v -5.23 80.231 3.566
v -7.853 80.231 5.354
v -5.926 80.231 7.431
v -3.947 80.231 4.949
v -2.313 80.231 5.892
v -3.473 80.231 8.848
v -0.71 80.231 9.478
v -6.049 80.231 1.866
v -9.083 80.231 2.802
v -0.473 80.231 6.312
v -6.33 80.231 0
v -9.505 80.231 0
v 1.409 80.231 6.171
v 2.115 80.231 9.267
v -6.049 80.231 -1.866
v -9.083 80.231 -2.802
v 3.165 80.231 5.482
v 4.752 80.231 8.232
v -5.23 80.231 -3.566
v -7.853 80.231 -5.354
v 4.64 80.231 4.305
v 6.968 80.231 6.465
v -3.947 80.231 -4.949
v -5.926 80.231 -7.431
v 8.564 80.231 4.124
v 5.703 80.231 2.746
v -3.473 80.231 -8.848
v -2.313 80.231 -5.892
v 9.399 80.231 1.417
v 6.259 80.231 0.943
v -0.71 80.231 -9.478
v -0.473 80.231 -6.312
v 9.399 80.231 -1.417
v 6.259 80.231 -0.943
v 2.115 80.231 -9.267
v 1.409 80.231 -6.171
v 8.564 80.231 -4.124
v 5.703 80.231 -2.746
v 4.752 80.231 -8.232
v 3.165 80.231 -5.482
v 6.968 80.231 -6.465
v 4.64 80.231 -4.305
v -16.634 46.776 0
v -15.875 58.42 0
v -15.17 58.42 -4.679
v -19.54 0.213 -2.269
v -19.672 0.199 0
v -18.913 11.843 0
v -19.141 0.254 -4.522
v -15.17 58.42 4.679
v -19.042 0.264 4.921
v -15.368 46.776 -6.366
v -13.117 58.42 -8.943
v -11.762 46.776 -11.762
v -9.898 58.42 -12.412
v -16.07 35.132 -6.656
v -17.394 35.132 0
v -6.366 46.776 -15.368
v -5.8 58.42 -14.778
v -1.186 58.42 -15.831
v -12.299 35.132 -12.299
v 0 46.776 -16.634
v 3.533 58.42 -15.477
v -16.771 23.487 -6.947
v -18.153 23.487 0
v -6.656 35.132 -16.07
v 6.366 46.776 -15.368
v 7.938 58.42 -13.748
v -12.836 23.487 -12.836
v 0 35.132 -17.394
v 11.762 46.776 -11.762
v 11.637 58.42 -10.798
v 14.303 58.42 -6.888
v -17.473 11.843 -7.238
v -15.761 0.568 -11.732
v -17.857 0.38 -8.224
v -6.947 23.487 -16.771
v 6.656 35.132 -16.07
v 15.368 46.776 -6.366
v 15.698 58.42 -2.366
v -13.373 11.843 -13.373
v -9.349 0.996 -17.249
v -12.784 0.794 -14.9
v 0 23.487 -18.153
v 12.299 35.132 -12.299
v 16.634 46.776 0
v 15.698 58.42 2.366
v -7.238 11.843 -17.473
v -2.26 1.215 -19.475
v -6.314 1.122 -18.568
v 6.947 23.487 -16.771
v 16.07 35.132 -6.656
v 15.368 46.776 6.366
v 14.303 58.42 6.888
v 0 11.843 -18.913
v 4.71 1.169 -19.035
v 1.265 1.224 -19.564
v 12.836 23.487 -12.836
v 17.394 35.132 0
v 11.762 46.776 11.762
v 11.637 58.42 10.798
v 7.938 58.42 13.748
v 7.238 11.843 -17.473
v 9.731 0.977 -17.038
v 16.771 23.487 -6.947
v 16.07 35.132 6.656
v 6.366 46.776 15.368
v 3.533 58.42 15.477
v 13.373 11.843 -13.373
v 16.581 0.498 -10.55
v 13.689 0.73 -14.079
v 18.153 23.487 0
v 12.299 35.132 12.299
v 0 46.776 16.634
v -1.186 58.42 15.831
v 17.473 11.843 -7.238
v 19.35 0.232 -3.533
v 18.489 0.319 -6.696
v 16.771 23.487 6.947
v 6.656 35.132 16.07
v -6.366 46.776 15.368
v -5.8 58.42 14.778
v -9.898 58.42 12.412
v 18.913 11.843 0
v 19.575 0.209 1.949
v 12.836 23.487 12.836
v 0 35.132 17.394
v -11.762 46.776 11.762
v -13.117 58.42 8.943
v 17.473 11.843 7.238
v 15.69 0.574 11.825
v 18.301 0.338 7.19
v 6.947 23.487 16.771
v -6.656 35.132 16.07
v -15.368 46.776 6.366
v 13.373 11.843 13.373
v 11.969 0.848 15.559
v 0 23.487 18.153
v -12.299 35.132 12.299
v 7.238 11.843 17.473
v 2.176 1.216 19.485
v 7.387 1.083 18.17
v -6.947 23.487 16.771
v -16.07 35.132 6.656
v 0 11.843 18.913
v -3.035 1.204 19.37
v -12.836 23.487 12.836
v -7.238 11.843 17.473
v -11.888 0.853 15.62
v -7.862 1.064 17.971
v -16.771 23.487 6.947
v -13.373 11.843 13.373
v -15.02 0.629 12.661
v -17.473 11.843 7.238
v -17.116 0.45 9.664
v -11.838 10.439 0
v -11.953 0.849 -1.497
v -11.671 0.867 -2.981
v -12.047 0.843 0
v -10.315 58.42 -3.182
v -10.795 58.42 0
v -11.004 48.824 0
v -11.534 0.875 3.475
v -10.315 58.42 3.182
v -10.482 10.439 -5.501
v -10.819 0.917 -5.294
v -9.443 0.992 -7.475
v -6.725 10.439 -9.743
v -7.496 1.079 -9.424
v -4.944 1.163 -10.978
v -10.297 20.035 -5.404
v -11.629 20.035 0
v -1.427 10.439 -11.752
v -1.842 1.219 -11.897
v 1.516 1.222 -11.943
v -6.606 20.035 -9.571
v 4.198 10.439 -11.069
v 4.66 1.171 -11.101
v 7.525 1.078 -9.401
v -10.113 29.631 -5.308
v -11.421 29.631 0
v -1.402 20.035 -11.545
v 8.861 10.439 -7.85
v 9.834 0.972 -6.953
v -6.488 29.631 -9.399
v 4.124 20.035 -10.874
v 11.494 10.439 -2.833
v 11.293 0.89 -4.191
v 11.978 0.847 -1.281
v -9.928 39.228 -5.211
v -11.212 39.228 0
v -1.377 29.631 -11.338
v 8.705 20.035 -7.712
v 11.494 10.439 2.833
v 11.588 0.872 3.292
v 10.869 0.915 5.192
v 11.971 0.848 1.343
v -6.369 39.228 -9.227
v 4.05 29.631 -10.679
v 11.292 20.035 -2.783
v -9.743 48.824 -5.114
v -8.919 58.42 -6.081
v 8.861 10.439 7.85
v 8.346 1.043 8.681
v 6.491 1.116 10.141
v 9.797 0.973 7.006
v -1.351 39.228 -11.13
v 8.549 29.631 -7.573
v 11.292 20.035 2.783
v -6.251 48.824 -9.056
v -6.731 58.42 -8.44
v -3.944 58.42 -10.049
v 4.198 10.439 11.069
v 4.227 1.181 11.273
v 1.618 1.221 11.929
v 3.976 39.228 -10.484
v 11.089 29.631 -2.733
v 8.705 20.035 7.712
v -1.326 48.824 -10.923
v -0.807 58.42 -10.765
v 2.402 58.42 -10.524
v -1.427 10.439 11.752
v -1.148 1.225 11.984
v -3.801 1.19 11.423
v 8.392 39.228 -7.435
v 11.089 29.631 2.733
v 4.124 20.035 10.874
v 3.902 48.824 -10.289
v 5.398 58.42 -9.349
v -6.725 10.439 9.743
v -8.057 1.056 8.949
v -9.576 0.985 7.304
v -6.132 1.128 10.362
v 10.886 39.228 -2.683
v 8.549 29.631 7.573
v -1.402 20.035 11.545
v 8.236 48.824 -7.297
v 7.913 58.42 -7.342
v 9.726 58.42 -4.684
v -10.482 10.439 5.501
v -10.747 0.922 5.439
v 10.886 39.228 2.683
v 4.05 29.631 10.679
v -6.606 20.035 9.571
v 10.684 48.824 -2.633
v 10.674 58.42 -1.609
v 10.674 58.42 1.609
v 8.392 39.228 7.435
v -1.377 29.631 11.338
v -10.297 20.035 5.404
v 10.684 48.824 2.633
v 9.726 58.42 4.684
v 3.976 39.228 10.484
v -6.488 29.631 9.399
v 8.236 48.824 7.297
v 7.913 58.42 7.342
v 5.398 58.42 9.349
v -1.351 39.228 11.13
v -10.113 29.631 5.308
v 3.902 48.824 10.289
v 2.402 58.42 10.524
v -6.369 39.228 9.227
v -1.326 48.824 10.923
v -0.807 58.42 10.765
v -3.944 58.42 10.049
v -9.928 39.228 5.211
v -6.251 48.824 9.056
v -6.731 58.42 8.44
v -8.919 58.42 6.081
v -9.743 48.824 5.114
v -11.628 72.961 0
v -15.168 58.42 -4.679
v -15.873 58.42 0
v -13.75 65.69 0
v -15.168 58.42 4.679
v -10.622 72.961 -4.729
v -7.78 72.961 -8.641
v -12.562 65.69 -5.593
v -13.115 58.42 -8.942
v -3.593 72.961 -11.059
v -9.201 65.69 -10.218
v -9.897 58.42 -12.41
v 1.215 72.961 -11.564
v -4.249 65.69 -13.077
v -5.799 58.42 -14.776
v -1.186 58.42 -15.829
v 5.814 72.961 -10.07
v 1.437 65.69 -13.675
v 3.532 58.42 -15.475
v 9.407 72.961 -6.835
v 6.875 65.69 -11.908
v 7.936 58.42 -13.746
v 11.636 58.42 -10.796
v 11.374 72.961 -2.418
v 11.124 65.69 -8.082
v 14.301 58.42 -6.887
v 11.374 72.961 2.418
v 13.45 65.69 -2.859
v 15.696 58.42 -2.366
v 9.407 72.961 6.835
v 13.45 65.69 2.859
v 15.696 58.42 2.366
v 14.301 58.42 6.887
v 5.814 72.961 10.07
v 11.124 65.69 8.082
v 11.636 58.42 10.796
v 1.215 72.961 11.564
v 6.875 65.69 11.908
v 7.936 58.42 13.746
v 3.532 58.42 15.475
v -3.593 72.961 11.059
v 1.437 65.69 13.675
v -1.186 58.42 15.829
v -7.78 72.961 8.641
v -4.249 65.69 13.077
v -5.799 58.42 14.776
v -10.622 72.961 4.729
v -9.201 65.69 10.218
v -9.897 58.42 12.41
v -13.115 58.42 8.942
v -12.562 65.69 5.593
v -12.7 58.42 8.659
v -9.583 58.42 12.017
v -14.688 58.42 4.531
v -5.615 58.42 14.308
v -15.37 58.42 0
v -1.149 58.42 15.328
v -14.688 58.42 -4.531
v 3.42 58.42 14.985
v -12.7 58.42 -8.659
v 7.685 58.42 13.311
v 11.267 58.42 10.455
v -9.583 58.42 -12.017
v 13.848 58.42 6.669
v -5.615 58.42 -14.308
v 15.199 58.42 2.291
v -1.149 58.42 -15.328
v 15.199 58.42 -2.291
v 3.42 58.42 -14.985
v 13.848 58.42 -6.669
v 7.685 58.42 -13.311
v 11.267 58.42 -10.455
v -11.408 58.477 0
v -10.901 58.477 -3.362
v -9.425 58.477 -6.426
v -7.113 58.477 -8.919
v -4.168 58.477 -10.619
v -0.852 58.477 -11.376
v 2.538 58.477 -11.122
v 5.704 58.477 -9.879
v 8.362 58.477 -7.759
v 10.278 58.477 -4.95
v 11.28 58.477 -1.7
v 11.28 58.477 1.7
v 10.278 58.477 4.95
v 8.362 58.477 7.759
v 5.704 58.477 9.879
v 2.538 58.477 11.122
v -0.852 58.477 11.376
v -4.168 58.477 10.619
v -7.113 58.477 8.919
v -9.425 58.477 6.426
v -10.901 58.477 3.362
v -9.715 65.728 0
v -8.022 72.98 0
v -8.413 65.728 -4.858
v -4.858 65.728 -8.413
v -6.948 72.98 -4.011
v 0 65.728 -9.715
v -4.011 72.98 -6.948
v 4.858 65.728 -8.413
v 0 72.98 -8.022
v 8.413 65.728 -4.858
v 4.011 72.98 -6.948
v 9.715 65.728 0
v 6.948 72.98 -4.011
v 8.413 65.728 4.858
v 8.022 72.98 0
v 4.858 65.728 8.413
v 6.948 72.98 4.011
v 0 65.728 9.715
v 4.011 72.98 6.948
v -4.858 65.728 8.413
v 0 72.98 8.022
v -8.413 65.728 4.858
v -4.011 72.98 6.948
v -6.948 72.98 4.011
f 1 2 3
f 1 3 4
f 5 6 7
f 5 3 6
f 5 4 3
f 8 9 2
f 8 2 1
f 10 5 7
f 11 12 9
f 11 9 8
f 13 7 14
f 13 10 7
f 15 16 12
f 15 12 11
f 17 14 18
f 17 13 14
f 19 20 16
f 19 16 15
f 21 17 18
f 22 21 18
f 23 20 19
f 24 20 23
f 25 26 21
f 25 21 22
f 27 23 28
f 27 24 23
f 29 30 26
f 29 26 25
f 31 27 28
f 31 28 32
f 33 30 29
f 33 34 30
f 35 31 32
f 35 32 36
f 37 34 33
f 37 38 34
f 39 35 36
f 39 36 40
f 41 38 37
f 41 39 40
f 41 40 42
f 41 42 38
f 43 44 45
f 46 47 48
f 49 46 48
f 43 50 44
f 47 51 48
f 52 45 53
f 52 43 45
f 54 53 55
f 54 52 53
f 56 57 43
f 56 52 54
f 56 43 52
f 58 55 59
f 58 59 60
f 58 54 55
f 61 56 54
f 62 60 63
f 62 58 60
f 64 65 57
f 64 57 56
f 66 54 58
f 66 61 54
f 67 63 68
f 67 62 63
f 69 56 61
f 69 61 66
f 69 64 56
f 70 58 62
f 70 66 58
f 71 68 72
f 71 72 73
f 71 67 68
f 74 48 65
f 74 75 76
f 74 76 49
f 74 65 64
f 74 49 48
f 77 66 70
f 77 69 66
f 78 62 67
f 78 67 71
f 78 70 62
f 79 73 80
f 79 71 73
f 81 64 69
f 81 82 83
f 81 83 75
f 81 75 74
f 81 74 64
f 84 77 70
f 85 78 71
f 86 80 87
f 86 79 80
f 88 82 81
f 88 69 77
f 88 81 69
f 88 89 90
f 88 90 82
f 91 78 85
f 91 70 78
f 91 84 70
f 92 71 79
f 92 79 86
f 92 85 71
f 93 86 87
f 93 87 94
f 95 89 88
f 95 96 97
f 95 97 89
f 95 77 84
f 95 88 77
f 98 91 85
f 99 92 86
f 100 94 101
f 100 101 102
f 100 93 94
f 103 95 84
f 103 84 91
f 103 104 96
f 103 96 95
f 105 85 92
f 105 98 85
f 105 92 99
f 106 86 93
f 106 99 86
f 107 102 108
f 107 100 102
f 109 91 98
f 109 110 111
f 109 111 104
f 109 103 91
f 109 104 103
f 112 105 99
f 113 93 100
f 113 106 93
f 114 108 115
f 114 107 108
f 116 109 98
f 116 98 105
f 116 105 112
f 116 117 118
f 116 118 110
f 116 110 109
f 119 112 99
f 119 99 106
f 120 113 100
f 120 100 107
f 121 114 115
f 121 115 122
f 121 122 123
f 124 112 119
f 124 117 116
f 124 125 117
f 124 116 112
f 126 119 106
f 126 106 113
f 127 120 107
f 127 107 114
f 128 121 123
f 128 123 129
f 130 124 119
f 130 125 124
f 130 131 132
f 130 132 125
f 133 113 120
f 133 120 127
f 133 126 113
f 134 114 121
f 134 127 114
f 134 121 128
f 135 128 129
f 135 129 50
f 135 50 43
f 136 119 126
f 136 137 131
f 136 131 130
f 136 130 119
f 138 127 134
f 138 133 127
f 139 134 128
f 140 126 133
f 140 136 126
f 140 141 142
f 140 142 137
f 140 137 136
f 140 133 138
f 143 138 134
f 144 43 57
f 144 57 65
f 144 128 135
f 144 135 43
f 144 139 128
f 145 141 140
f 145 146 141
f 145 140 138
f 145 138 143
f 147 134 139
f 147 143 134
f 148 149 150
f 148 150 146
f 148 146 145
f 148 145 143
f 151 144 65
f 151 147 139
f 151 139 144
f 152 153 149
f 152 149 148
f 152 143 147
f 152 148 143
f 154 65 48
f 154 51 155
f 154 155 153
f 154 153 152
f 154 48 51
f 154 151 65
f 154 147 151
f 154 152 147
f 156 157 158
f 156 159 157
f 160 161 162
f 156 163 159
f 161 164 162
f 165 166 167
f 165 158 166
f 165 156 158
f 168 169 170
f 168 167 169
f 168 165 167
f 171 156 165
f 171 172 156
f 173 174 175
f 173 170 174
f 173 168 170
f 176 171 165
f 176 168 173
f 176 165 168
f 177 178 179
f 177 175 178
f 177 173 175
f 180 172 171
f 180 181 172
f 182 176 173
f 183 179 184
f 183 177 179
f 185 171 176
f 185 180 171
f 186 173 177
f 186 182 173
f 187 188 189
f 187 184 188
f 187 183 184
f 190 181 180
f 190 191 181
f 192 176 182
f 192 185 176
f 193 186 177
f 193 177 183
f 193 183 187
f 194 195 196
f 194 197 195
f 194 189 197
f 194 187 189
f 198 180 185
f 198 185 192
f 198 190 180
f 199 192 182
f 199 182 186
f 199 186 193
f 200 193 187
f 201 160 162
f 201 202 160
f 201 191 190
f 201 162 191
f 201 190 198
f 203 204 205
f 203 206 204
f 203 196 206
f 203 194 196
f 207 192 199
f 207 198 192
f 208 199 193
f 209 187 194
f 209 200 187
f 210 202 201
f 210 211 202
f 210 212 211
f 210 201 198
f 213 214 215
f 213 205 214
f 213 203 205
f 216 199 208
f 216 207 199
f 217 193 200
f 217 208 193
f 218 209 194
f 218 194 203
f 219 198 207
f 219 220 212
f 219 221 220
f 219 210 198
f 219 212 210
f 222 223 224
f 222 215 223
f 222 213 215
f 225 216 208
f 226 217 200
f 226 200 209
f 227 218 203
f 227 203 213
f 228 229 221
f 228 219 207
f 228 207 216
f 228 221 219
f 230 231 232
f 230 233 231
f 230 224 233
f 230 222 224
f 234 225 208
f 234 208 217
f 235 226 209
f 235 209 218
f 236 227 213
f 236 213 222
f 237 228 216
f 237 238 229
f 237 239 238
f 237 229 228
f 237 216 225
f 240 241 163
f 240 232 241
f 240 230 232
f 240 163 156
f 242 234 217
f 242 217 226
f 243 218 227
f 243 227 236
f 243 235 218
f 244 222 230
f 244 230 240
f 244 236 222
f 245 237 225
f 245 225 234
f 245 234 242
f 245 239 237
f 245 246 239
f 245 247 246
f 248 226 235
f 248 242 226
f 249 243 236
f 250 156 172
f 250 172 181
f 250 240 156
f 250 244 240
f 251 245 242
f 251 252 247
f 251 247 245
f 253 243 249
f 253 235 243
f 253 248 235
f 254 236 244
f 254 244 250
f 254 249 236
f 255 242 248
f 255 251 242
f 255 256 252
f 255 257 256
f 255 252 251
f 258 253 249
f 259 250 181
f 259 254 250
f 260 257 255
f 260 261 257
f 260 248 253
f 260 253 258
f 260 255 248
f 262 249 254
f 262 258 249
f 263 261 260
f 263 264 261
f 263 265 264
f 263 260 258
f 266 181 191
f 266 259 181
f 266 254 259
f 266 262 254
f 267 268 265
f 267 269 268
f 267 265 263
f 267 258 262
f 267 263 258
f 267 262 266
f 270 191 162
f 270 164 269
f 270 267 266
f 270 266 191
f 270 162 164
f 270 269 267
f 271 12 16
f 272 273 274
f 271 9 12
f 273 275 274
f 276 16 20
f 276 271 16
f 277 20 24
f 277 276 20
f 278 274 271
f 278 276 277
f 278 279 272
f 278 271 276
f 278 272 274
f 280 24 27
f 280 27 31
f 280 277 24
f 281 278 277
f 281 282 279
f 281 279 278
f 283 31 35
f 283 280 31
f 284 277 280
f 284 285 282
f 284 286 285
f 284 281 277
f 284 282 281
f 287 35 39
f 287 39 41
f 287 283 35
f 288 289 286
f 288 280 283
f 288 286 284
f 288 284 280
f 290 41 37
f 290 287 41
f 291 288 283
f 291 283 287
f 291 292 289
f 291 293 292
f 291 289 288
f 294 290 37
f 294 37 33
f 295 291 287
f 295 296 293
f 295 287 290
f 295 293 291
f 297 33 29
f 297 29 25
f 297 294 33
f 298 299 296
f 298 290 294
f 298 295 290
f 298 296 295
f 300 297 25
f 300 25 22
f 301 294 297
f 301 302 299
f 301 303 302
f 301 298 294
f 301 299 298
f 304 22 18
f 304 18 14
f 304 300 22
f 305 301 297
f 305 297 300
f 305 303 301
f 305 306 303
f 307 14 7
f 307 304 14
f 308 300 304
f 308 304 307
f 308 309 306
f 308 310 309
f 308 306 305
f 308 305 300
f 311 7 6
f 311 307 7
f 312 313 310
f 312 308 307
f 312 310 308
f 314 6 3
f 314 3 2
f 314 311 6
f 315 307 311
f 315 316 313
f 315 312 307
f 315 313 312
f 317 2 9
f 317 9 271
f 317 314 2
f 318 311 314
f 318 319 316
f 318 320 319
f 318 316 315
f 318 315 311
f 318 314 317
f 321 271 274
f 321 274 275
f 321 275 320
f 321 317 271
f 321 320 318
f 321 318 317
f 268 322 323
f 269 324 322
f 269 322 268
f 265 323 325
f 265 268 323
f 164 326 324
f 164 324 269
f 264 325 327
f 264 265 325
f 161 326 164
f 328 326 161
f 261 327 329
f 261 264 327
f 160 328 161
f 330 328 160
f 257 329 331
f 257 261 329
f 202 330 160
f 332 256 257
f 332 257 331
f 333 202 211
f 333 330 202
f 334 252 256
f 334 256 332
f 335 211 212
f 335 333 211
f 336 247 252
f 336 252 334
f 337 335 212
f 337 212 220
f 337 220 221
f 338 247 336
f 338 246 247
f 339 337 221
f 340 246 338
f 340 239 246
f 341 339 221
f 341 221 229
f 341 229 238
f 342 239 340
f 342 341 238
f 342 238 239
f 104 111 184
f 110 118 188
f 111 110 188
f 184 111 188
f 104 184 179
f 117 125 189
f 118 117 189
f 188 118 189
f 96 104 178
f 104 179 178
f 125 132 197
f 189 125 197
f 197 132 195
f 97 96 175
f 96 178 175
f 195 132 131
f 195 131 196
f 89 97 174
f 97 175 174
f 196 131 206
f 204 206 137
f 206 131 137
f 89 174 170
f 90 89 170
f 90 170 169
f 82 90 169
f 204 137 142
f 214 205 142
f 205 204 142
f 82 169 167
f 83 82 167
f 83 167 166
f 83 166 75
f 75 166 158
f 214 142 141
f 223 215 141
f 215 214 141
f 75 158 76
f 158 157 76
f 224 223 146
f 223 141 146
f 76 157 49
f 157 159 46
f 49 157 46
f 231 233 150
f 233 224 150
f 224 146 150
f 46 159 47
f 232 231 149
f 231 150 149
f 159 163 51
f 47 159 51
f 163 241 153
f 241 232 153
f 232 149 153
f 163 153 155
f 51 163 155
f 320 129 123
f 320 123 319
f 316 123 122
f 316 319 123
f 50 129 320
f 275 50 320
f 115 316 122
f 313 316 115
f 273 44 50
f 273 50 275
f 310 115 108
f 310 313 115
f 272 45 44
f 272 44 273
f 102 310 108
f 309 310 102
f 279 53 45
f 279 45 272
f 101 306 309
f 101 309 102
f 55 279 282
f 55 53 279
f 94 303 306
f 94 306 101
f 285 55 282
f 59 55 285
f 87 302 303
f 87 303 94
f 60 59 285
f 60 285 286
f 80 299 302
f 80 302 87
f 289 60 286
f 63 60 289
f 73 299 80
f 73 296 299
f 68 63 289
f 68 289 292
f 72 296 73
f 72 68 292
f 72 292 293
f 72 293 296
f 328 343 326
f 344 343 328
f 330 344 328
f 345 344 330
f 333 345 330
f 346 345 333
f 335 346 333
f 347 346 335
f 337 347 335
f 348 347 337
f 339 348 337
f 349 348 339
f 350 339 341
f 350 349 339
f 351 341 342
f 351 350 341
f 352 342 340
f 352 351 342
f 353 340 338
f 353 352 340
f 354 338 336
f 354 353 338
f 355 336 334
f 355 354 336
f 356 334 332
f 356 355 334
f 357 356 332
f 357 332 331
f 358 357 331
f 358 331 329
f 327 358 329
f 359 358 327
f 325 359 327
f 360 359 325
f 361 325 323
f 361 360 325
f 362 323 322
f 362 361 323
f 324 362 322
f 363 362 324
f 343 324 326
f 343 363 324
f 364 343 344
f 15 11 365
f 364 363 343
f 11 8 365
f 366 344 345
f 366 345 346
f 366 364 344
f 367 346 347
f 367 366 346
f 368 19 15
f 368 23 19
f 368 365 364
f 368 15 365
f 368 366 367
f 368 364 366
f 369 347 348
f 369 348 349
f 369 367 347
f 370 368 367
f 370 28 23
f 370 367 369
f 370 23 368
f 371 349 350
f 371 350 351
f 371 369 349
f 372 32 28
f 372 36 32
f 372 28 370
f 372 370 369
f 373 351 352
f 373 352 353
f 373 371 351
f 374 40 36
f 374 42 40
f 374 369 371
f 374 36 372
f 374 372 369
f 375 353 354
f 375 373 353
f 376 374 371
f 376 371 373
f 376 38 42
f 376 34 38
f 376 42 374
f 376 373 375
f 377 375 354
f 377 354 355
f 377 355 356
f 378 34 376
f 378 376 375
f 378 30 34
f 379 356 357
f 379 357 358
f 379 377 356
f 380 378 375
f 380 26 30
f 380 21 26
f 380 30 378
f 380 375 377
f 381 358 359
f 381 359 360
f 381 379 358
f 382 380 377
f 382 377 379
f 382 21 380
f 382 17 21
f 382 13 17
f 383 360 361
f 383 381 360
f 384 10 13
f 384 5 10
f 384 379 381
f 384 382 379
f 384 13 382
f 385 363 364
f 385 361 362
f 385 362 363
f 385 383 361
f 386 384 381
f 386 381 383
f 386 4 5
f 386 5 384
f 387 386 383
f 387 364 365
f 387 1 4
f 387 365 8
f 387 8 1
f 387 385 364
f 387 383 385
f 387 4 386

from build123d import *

# Parameters (mm, degrees)
F2_R     = 188.496796
F3_DEPTH = 25.4


with BuildPart() as f1:
    # F0 (on Top) → F1 (revolve)
    with BuildSketch(Plane.XY):
        Polygon((-19.685, 0), (-12.065, 0), (-10.795, 58.42), (-15.875, 58.42), align=None)
    revolve(axis=Axis((0, 29.21, 0), (0, -1, 0)))

    # F2 (on Top) → F3 (cut, symmetric)
    with BuildSketch(Plane.XY):
        with Locations((0, -187.268555)):
            Circle(F2_R)
    extrude(amount=F3_DEPTH, both=True, mode=Mode.SUBTRACT)

    # F4 (on Top) → F5 (revolve)
    with BuildSketch(Plane.XY):
        Polygon((-9.50494, 80.231339), (-15.875068, 58.412734), (-11.407575, 58.477067), (-6.329941, 80.231339), align=None)
    revolve(axis=Axis((0, 69.436338, 0), (0, -1, 0)))


solid = f1.part
